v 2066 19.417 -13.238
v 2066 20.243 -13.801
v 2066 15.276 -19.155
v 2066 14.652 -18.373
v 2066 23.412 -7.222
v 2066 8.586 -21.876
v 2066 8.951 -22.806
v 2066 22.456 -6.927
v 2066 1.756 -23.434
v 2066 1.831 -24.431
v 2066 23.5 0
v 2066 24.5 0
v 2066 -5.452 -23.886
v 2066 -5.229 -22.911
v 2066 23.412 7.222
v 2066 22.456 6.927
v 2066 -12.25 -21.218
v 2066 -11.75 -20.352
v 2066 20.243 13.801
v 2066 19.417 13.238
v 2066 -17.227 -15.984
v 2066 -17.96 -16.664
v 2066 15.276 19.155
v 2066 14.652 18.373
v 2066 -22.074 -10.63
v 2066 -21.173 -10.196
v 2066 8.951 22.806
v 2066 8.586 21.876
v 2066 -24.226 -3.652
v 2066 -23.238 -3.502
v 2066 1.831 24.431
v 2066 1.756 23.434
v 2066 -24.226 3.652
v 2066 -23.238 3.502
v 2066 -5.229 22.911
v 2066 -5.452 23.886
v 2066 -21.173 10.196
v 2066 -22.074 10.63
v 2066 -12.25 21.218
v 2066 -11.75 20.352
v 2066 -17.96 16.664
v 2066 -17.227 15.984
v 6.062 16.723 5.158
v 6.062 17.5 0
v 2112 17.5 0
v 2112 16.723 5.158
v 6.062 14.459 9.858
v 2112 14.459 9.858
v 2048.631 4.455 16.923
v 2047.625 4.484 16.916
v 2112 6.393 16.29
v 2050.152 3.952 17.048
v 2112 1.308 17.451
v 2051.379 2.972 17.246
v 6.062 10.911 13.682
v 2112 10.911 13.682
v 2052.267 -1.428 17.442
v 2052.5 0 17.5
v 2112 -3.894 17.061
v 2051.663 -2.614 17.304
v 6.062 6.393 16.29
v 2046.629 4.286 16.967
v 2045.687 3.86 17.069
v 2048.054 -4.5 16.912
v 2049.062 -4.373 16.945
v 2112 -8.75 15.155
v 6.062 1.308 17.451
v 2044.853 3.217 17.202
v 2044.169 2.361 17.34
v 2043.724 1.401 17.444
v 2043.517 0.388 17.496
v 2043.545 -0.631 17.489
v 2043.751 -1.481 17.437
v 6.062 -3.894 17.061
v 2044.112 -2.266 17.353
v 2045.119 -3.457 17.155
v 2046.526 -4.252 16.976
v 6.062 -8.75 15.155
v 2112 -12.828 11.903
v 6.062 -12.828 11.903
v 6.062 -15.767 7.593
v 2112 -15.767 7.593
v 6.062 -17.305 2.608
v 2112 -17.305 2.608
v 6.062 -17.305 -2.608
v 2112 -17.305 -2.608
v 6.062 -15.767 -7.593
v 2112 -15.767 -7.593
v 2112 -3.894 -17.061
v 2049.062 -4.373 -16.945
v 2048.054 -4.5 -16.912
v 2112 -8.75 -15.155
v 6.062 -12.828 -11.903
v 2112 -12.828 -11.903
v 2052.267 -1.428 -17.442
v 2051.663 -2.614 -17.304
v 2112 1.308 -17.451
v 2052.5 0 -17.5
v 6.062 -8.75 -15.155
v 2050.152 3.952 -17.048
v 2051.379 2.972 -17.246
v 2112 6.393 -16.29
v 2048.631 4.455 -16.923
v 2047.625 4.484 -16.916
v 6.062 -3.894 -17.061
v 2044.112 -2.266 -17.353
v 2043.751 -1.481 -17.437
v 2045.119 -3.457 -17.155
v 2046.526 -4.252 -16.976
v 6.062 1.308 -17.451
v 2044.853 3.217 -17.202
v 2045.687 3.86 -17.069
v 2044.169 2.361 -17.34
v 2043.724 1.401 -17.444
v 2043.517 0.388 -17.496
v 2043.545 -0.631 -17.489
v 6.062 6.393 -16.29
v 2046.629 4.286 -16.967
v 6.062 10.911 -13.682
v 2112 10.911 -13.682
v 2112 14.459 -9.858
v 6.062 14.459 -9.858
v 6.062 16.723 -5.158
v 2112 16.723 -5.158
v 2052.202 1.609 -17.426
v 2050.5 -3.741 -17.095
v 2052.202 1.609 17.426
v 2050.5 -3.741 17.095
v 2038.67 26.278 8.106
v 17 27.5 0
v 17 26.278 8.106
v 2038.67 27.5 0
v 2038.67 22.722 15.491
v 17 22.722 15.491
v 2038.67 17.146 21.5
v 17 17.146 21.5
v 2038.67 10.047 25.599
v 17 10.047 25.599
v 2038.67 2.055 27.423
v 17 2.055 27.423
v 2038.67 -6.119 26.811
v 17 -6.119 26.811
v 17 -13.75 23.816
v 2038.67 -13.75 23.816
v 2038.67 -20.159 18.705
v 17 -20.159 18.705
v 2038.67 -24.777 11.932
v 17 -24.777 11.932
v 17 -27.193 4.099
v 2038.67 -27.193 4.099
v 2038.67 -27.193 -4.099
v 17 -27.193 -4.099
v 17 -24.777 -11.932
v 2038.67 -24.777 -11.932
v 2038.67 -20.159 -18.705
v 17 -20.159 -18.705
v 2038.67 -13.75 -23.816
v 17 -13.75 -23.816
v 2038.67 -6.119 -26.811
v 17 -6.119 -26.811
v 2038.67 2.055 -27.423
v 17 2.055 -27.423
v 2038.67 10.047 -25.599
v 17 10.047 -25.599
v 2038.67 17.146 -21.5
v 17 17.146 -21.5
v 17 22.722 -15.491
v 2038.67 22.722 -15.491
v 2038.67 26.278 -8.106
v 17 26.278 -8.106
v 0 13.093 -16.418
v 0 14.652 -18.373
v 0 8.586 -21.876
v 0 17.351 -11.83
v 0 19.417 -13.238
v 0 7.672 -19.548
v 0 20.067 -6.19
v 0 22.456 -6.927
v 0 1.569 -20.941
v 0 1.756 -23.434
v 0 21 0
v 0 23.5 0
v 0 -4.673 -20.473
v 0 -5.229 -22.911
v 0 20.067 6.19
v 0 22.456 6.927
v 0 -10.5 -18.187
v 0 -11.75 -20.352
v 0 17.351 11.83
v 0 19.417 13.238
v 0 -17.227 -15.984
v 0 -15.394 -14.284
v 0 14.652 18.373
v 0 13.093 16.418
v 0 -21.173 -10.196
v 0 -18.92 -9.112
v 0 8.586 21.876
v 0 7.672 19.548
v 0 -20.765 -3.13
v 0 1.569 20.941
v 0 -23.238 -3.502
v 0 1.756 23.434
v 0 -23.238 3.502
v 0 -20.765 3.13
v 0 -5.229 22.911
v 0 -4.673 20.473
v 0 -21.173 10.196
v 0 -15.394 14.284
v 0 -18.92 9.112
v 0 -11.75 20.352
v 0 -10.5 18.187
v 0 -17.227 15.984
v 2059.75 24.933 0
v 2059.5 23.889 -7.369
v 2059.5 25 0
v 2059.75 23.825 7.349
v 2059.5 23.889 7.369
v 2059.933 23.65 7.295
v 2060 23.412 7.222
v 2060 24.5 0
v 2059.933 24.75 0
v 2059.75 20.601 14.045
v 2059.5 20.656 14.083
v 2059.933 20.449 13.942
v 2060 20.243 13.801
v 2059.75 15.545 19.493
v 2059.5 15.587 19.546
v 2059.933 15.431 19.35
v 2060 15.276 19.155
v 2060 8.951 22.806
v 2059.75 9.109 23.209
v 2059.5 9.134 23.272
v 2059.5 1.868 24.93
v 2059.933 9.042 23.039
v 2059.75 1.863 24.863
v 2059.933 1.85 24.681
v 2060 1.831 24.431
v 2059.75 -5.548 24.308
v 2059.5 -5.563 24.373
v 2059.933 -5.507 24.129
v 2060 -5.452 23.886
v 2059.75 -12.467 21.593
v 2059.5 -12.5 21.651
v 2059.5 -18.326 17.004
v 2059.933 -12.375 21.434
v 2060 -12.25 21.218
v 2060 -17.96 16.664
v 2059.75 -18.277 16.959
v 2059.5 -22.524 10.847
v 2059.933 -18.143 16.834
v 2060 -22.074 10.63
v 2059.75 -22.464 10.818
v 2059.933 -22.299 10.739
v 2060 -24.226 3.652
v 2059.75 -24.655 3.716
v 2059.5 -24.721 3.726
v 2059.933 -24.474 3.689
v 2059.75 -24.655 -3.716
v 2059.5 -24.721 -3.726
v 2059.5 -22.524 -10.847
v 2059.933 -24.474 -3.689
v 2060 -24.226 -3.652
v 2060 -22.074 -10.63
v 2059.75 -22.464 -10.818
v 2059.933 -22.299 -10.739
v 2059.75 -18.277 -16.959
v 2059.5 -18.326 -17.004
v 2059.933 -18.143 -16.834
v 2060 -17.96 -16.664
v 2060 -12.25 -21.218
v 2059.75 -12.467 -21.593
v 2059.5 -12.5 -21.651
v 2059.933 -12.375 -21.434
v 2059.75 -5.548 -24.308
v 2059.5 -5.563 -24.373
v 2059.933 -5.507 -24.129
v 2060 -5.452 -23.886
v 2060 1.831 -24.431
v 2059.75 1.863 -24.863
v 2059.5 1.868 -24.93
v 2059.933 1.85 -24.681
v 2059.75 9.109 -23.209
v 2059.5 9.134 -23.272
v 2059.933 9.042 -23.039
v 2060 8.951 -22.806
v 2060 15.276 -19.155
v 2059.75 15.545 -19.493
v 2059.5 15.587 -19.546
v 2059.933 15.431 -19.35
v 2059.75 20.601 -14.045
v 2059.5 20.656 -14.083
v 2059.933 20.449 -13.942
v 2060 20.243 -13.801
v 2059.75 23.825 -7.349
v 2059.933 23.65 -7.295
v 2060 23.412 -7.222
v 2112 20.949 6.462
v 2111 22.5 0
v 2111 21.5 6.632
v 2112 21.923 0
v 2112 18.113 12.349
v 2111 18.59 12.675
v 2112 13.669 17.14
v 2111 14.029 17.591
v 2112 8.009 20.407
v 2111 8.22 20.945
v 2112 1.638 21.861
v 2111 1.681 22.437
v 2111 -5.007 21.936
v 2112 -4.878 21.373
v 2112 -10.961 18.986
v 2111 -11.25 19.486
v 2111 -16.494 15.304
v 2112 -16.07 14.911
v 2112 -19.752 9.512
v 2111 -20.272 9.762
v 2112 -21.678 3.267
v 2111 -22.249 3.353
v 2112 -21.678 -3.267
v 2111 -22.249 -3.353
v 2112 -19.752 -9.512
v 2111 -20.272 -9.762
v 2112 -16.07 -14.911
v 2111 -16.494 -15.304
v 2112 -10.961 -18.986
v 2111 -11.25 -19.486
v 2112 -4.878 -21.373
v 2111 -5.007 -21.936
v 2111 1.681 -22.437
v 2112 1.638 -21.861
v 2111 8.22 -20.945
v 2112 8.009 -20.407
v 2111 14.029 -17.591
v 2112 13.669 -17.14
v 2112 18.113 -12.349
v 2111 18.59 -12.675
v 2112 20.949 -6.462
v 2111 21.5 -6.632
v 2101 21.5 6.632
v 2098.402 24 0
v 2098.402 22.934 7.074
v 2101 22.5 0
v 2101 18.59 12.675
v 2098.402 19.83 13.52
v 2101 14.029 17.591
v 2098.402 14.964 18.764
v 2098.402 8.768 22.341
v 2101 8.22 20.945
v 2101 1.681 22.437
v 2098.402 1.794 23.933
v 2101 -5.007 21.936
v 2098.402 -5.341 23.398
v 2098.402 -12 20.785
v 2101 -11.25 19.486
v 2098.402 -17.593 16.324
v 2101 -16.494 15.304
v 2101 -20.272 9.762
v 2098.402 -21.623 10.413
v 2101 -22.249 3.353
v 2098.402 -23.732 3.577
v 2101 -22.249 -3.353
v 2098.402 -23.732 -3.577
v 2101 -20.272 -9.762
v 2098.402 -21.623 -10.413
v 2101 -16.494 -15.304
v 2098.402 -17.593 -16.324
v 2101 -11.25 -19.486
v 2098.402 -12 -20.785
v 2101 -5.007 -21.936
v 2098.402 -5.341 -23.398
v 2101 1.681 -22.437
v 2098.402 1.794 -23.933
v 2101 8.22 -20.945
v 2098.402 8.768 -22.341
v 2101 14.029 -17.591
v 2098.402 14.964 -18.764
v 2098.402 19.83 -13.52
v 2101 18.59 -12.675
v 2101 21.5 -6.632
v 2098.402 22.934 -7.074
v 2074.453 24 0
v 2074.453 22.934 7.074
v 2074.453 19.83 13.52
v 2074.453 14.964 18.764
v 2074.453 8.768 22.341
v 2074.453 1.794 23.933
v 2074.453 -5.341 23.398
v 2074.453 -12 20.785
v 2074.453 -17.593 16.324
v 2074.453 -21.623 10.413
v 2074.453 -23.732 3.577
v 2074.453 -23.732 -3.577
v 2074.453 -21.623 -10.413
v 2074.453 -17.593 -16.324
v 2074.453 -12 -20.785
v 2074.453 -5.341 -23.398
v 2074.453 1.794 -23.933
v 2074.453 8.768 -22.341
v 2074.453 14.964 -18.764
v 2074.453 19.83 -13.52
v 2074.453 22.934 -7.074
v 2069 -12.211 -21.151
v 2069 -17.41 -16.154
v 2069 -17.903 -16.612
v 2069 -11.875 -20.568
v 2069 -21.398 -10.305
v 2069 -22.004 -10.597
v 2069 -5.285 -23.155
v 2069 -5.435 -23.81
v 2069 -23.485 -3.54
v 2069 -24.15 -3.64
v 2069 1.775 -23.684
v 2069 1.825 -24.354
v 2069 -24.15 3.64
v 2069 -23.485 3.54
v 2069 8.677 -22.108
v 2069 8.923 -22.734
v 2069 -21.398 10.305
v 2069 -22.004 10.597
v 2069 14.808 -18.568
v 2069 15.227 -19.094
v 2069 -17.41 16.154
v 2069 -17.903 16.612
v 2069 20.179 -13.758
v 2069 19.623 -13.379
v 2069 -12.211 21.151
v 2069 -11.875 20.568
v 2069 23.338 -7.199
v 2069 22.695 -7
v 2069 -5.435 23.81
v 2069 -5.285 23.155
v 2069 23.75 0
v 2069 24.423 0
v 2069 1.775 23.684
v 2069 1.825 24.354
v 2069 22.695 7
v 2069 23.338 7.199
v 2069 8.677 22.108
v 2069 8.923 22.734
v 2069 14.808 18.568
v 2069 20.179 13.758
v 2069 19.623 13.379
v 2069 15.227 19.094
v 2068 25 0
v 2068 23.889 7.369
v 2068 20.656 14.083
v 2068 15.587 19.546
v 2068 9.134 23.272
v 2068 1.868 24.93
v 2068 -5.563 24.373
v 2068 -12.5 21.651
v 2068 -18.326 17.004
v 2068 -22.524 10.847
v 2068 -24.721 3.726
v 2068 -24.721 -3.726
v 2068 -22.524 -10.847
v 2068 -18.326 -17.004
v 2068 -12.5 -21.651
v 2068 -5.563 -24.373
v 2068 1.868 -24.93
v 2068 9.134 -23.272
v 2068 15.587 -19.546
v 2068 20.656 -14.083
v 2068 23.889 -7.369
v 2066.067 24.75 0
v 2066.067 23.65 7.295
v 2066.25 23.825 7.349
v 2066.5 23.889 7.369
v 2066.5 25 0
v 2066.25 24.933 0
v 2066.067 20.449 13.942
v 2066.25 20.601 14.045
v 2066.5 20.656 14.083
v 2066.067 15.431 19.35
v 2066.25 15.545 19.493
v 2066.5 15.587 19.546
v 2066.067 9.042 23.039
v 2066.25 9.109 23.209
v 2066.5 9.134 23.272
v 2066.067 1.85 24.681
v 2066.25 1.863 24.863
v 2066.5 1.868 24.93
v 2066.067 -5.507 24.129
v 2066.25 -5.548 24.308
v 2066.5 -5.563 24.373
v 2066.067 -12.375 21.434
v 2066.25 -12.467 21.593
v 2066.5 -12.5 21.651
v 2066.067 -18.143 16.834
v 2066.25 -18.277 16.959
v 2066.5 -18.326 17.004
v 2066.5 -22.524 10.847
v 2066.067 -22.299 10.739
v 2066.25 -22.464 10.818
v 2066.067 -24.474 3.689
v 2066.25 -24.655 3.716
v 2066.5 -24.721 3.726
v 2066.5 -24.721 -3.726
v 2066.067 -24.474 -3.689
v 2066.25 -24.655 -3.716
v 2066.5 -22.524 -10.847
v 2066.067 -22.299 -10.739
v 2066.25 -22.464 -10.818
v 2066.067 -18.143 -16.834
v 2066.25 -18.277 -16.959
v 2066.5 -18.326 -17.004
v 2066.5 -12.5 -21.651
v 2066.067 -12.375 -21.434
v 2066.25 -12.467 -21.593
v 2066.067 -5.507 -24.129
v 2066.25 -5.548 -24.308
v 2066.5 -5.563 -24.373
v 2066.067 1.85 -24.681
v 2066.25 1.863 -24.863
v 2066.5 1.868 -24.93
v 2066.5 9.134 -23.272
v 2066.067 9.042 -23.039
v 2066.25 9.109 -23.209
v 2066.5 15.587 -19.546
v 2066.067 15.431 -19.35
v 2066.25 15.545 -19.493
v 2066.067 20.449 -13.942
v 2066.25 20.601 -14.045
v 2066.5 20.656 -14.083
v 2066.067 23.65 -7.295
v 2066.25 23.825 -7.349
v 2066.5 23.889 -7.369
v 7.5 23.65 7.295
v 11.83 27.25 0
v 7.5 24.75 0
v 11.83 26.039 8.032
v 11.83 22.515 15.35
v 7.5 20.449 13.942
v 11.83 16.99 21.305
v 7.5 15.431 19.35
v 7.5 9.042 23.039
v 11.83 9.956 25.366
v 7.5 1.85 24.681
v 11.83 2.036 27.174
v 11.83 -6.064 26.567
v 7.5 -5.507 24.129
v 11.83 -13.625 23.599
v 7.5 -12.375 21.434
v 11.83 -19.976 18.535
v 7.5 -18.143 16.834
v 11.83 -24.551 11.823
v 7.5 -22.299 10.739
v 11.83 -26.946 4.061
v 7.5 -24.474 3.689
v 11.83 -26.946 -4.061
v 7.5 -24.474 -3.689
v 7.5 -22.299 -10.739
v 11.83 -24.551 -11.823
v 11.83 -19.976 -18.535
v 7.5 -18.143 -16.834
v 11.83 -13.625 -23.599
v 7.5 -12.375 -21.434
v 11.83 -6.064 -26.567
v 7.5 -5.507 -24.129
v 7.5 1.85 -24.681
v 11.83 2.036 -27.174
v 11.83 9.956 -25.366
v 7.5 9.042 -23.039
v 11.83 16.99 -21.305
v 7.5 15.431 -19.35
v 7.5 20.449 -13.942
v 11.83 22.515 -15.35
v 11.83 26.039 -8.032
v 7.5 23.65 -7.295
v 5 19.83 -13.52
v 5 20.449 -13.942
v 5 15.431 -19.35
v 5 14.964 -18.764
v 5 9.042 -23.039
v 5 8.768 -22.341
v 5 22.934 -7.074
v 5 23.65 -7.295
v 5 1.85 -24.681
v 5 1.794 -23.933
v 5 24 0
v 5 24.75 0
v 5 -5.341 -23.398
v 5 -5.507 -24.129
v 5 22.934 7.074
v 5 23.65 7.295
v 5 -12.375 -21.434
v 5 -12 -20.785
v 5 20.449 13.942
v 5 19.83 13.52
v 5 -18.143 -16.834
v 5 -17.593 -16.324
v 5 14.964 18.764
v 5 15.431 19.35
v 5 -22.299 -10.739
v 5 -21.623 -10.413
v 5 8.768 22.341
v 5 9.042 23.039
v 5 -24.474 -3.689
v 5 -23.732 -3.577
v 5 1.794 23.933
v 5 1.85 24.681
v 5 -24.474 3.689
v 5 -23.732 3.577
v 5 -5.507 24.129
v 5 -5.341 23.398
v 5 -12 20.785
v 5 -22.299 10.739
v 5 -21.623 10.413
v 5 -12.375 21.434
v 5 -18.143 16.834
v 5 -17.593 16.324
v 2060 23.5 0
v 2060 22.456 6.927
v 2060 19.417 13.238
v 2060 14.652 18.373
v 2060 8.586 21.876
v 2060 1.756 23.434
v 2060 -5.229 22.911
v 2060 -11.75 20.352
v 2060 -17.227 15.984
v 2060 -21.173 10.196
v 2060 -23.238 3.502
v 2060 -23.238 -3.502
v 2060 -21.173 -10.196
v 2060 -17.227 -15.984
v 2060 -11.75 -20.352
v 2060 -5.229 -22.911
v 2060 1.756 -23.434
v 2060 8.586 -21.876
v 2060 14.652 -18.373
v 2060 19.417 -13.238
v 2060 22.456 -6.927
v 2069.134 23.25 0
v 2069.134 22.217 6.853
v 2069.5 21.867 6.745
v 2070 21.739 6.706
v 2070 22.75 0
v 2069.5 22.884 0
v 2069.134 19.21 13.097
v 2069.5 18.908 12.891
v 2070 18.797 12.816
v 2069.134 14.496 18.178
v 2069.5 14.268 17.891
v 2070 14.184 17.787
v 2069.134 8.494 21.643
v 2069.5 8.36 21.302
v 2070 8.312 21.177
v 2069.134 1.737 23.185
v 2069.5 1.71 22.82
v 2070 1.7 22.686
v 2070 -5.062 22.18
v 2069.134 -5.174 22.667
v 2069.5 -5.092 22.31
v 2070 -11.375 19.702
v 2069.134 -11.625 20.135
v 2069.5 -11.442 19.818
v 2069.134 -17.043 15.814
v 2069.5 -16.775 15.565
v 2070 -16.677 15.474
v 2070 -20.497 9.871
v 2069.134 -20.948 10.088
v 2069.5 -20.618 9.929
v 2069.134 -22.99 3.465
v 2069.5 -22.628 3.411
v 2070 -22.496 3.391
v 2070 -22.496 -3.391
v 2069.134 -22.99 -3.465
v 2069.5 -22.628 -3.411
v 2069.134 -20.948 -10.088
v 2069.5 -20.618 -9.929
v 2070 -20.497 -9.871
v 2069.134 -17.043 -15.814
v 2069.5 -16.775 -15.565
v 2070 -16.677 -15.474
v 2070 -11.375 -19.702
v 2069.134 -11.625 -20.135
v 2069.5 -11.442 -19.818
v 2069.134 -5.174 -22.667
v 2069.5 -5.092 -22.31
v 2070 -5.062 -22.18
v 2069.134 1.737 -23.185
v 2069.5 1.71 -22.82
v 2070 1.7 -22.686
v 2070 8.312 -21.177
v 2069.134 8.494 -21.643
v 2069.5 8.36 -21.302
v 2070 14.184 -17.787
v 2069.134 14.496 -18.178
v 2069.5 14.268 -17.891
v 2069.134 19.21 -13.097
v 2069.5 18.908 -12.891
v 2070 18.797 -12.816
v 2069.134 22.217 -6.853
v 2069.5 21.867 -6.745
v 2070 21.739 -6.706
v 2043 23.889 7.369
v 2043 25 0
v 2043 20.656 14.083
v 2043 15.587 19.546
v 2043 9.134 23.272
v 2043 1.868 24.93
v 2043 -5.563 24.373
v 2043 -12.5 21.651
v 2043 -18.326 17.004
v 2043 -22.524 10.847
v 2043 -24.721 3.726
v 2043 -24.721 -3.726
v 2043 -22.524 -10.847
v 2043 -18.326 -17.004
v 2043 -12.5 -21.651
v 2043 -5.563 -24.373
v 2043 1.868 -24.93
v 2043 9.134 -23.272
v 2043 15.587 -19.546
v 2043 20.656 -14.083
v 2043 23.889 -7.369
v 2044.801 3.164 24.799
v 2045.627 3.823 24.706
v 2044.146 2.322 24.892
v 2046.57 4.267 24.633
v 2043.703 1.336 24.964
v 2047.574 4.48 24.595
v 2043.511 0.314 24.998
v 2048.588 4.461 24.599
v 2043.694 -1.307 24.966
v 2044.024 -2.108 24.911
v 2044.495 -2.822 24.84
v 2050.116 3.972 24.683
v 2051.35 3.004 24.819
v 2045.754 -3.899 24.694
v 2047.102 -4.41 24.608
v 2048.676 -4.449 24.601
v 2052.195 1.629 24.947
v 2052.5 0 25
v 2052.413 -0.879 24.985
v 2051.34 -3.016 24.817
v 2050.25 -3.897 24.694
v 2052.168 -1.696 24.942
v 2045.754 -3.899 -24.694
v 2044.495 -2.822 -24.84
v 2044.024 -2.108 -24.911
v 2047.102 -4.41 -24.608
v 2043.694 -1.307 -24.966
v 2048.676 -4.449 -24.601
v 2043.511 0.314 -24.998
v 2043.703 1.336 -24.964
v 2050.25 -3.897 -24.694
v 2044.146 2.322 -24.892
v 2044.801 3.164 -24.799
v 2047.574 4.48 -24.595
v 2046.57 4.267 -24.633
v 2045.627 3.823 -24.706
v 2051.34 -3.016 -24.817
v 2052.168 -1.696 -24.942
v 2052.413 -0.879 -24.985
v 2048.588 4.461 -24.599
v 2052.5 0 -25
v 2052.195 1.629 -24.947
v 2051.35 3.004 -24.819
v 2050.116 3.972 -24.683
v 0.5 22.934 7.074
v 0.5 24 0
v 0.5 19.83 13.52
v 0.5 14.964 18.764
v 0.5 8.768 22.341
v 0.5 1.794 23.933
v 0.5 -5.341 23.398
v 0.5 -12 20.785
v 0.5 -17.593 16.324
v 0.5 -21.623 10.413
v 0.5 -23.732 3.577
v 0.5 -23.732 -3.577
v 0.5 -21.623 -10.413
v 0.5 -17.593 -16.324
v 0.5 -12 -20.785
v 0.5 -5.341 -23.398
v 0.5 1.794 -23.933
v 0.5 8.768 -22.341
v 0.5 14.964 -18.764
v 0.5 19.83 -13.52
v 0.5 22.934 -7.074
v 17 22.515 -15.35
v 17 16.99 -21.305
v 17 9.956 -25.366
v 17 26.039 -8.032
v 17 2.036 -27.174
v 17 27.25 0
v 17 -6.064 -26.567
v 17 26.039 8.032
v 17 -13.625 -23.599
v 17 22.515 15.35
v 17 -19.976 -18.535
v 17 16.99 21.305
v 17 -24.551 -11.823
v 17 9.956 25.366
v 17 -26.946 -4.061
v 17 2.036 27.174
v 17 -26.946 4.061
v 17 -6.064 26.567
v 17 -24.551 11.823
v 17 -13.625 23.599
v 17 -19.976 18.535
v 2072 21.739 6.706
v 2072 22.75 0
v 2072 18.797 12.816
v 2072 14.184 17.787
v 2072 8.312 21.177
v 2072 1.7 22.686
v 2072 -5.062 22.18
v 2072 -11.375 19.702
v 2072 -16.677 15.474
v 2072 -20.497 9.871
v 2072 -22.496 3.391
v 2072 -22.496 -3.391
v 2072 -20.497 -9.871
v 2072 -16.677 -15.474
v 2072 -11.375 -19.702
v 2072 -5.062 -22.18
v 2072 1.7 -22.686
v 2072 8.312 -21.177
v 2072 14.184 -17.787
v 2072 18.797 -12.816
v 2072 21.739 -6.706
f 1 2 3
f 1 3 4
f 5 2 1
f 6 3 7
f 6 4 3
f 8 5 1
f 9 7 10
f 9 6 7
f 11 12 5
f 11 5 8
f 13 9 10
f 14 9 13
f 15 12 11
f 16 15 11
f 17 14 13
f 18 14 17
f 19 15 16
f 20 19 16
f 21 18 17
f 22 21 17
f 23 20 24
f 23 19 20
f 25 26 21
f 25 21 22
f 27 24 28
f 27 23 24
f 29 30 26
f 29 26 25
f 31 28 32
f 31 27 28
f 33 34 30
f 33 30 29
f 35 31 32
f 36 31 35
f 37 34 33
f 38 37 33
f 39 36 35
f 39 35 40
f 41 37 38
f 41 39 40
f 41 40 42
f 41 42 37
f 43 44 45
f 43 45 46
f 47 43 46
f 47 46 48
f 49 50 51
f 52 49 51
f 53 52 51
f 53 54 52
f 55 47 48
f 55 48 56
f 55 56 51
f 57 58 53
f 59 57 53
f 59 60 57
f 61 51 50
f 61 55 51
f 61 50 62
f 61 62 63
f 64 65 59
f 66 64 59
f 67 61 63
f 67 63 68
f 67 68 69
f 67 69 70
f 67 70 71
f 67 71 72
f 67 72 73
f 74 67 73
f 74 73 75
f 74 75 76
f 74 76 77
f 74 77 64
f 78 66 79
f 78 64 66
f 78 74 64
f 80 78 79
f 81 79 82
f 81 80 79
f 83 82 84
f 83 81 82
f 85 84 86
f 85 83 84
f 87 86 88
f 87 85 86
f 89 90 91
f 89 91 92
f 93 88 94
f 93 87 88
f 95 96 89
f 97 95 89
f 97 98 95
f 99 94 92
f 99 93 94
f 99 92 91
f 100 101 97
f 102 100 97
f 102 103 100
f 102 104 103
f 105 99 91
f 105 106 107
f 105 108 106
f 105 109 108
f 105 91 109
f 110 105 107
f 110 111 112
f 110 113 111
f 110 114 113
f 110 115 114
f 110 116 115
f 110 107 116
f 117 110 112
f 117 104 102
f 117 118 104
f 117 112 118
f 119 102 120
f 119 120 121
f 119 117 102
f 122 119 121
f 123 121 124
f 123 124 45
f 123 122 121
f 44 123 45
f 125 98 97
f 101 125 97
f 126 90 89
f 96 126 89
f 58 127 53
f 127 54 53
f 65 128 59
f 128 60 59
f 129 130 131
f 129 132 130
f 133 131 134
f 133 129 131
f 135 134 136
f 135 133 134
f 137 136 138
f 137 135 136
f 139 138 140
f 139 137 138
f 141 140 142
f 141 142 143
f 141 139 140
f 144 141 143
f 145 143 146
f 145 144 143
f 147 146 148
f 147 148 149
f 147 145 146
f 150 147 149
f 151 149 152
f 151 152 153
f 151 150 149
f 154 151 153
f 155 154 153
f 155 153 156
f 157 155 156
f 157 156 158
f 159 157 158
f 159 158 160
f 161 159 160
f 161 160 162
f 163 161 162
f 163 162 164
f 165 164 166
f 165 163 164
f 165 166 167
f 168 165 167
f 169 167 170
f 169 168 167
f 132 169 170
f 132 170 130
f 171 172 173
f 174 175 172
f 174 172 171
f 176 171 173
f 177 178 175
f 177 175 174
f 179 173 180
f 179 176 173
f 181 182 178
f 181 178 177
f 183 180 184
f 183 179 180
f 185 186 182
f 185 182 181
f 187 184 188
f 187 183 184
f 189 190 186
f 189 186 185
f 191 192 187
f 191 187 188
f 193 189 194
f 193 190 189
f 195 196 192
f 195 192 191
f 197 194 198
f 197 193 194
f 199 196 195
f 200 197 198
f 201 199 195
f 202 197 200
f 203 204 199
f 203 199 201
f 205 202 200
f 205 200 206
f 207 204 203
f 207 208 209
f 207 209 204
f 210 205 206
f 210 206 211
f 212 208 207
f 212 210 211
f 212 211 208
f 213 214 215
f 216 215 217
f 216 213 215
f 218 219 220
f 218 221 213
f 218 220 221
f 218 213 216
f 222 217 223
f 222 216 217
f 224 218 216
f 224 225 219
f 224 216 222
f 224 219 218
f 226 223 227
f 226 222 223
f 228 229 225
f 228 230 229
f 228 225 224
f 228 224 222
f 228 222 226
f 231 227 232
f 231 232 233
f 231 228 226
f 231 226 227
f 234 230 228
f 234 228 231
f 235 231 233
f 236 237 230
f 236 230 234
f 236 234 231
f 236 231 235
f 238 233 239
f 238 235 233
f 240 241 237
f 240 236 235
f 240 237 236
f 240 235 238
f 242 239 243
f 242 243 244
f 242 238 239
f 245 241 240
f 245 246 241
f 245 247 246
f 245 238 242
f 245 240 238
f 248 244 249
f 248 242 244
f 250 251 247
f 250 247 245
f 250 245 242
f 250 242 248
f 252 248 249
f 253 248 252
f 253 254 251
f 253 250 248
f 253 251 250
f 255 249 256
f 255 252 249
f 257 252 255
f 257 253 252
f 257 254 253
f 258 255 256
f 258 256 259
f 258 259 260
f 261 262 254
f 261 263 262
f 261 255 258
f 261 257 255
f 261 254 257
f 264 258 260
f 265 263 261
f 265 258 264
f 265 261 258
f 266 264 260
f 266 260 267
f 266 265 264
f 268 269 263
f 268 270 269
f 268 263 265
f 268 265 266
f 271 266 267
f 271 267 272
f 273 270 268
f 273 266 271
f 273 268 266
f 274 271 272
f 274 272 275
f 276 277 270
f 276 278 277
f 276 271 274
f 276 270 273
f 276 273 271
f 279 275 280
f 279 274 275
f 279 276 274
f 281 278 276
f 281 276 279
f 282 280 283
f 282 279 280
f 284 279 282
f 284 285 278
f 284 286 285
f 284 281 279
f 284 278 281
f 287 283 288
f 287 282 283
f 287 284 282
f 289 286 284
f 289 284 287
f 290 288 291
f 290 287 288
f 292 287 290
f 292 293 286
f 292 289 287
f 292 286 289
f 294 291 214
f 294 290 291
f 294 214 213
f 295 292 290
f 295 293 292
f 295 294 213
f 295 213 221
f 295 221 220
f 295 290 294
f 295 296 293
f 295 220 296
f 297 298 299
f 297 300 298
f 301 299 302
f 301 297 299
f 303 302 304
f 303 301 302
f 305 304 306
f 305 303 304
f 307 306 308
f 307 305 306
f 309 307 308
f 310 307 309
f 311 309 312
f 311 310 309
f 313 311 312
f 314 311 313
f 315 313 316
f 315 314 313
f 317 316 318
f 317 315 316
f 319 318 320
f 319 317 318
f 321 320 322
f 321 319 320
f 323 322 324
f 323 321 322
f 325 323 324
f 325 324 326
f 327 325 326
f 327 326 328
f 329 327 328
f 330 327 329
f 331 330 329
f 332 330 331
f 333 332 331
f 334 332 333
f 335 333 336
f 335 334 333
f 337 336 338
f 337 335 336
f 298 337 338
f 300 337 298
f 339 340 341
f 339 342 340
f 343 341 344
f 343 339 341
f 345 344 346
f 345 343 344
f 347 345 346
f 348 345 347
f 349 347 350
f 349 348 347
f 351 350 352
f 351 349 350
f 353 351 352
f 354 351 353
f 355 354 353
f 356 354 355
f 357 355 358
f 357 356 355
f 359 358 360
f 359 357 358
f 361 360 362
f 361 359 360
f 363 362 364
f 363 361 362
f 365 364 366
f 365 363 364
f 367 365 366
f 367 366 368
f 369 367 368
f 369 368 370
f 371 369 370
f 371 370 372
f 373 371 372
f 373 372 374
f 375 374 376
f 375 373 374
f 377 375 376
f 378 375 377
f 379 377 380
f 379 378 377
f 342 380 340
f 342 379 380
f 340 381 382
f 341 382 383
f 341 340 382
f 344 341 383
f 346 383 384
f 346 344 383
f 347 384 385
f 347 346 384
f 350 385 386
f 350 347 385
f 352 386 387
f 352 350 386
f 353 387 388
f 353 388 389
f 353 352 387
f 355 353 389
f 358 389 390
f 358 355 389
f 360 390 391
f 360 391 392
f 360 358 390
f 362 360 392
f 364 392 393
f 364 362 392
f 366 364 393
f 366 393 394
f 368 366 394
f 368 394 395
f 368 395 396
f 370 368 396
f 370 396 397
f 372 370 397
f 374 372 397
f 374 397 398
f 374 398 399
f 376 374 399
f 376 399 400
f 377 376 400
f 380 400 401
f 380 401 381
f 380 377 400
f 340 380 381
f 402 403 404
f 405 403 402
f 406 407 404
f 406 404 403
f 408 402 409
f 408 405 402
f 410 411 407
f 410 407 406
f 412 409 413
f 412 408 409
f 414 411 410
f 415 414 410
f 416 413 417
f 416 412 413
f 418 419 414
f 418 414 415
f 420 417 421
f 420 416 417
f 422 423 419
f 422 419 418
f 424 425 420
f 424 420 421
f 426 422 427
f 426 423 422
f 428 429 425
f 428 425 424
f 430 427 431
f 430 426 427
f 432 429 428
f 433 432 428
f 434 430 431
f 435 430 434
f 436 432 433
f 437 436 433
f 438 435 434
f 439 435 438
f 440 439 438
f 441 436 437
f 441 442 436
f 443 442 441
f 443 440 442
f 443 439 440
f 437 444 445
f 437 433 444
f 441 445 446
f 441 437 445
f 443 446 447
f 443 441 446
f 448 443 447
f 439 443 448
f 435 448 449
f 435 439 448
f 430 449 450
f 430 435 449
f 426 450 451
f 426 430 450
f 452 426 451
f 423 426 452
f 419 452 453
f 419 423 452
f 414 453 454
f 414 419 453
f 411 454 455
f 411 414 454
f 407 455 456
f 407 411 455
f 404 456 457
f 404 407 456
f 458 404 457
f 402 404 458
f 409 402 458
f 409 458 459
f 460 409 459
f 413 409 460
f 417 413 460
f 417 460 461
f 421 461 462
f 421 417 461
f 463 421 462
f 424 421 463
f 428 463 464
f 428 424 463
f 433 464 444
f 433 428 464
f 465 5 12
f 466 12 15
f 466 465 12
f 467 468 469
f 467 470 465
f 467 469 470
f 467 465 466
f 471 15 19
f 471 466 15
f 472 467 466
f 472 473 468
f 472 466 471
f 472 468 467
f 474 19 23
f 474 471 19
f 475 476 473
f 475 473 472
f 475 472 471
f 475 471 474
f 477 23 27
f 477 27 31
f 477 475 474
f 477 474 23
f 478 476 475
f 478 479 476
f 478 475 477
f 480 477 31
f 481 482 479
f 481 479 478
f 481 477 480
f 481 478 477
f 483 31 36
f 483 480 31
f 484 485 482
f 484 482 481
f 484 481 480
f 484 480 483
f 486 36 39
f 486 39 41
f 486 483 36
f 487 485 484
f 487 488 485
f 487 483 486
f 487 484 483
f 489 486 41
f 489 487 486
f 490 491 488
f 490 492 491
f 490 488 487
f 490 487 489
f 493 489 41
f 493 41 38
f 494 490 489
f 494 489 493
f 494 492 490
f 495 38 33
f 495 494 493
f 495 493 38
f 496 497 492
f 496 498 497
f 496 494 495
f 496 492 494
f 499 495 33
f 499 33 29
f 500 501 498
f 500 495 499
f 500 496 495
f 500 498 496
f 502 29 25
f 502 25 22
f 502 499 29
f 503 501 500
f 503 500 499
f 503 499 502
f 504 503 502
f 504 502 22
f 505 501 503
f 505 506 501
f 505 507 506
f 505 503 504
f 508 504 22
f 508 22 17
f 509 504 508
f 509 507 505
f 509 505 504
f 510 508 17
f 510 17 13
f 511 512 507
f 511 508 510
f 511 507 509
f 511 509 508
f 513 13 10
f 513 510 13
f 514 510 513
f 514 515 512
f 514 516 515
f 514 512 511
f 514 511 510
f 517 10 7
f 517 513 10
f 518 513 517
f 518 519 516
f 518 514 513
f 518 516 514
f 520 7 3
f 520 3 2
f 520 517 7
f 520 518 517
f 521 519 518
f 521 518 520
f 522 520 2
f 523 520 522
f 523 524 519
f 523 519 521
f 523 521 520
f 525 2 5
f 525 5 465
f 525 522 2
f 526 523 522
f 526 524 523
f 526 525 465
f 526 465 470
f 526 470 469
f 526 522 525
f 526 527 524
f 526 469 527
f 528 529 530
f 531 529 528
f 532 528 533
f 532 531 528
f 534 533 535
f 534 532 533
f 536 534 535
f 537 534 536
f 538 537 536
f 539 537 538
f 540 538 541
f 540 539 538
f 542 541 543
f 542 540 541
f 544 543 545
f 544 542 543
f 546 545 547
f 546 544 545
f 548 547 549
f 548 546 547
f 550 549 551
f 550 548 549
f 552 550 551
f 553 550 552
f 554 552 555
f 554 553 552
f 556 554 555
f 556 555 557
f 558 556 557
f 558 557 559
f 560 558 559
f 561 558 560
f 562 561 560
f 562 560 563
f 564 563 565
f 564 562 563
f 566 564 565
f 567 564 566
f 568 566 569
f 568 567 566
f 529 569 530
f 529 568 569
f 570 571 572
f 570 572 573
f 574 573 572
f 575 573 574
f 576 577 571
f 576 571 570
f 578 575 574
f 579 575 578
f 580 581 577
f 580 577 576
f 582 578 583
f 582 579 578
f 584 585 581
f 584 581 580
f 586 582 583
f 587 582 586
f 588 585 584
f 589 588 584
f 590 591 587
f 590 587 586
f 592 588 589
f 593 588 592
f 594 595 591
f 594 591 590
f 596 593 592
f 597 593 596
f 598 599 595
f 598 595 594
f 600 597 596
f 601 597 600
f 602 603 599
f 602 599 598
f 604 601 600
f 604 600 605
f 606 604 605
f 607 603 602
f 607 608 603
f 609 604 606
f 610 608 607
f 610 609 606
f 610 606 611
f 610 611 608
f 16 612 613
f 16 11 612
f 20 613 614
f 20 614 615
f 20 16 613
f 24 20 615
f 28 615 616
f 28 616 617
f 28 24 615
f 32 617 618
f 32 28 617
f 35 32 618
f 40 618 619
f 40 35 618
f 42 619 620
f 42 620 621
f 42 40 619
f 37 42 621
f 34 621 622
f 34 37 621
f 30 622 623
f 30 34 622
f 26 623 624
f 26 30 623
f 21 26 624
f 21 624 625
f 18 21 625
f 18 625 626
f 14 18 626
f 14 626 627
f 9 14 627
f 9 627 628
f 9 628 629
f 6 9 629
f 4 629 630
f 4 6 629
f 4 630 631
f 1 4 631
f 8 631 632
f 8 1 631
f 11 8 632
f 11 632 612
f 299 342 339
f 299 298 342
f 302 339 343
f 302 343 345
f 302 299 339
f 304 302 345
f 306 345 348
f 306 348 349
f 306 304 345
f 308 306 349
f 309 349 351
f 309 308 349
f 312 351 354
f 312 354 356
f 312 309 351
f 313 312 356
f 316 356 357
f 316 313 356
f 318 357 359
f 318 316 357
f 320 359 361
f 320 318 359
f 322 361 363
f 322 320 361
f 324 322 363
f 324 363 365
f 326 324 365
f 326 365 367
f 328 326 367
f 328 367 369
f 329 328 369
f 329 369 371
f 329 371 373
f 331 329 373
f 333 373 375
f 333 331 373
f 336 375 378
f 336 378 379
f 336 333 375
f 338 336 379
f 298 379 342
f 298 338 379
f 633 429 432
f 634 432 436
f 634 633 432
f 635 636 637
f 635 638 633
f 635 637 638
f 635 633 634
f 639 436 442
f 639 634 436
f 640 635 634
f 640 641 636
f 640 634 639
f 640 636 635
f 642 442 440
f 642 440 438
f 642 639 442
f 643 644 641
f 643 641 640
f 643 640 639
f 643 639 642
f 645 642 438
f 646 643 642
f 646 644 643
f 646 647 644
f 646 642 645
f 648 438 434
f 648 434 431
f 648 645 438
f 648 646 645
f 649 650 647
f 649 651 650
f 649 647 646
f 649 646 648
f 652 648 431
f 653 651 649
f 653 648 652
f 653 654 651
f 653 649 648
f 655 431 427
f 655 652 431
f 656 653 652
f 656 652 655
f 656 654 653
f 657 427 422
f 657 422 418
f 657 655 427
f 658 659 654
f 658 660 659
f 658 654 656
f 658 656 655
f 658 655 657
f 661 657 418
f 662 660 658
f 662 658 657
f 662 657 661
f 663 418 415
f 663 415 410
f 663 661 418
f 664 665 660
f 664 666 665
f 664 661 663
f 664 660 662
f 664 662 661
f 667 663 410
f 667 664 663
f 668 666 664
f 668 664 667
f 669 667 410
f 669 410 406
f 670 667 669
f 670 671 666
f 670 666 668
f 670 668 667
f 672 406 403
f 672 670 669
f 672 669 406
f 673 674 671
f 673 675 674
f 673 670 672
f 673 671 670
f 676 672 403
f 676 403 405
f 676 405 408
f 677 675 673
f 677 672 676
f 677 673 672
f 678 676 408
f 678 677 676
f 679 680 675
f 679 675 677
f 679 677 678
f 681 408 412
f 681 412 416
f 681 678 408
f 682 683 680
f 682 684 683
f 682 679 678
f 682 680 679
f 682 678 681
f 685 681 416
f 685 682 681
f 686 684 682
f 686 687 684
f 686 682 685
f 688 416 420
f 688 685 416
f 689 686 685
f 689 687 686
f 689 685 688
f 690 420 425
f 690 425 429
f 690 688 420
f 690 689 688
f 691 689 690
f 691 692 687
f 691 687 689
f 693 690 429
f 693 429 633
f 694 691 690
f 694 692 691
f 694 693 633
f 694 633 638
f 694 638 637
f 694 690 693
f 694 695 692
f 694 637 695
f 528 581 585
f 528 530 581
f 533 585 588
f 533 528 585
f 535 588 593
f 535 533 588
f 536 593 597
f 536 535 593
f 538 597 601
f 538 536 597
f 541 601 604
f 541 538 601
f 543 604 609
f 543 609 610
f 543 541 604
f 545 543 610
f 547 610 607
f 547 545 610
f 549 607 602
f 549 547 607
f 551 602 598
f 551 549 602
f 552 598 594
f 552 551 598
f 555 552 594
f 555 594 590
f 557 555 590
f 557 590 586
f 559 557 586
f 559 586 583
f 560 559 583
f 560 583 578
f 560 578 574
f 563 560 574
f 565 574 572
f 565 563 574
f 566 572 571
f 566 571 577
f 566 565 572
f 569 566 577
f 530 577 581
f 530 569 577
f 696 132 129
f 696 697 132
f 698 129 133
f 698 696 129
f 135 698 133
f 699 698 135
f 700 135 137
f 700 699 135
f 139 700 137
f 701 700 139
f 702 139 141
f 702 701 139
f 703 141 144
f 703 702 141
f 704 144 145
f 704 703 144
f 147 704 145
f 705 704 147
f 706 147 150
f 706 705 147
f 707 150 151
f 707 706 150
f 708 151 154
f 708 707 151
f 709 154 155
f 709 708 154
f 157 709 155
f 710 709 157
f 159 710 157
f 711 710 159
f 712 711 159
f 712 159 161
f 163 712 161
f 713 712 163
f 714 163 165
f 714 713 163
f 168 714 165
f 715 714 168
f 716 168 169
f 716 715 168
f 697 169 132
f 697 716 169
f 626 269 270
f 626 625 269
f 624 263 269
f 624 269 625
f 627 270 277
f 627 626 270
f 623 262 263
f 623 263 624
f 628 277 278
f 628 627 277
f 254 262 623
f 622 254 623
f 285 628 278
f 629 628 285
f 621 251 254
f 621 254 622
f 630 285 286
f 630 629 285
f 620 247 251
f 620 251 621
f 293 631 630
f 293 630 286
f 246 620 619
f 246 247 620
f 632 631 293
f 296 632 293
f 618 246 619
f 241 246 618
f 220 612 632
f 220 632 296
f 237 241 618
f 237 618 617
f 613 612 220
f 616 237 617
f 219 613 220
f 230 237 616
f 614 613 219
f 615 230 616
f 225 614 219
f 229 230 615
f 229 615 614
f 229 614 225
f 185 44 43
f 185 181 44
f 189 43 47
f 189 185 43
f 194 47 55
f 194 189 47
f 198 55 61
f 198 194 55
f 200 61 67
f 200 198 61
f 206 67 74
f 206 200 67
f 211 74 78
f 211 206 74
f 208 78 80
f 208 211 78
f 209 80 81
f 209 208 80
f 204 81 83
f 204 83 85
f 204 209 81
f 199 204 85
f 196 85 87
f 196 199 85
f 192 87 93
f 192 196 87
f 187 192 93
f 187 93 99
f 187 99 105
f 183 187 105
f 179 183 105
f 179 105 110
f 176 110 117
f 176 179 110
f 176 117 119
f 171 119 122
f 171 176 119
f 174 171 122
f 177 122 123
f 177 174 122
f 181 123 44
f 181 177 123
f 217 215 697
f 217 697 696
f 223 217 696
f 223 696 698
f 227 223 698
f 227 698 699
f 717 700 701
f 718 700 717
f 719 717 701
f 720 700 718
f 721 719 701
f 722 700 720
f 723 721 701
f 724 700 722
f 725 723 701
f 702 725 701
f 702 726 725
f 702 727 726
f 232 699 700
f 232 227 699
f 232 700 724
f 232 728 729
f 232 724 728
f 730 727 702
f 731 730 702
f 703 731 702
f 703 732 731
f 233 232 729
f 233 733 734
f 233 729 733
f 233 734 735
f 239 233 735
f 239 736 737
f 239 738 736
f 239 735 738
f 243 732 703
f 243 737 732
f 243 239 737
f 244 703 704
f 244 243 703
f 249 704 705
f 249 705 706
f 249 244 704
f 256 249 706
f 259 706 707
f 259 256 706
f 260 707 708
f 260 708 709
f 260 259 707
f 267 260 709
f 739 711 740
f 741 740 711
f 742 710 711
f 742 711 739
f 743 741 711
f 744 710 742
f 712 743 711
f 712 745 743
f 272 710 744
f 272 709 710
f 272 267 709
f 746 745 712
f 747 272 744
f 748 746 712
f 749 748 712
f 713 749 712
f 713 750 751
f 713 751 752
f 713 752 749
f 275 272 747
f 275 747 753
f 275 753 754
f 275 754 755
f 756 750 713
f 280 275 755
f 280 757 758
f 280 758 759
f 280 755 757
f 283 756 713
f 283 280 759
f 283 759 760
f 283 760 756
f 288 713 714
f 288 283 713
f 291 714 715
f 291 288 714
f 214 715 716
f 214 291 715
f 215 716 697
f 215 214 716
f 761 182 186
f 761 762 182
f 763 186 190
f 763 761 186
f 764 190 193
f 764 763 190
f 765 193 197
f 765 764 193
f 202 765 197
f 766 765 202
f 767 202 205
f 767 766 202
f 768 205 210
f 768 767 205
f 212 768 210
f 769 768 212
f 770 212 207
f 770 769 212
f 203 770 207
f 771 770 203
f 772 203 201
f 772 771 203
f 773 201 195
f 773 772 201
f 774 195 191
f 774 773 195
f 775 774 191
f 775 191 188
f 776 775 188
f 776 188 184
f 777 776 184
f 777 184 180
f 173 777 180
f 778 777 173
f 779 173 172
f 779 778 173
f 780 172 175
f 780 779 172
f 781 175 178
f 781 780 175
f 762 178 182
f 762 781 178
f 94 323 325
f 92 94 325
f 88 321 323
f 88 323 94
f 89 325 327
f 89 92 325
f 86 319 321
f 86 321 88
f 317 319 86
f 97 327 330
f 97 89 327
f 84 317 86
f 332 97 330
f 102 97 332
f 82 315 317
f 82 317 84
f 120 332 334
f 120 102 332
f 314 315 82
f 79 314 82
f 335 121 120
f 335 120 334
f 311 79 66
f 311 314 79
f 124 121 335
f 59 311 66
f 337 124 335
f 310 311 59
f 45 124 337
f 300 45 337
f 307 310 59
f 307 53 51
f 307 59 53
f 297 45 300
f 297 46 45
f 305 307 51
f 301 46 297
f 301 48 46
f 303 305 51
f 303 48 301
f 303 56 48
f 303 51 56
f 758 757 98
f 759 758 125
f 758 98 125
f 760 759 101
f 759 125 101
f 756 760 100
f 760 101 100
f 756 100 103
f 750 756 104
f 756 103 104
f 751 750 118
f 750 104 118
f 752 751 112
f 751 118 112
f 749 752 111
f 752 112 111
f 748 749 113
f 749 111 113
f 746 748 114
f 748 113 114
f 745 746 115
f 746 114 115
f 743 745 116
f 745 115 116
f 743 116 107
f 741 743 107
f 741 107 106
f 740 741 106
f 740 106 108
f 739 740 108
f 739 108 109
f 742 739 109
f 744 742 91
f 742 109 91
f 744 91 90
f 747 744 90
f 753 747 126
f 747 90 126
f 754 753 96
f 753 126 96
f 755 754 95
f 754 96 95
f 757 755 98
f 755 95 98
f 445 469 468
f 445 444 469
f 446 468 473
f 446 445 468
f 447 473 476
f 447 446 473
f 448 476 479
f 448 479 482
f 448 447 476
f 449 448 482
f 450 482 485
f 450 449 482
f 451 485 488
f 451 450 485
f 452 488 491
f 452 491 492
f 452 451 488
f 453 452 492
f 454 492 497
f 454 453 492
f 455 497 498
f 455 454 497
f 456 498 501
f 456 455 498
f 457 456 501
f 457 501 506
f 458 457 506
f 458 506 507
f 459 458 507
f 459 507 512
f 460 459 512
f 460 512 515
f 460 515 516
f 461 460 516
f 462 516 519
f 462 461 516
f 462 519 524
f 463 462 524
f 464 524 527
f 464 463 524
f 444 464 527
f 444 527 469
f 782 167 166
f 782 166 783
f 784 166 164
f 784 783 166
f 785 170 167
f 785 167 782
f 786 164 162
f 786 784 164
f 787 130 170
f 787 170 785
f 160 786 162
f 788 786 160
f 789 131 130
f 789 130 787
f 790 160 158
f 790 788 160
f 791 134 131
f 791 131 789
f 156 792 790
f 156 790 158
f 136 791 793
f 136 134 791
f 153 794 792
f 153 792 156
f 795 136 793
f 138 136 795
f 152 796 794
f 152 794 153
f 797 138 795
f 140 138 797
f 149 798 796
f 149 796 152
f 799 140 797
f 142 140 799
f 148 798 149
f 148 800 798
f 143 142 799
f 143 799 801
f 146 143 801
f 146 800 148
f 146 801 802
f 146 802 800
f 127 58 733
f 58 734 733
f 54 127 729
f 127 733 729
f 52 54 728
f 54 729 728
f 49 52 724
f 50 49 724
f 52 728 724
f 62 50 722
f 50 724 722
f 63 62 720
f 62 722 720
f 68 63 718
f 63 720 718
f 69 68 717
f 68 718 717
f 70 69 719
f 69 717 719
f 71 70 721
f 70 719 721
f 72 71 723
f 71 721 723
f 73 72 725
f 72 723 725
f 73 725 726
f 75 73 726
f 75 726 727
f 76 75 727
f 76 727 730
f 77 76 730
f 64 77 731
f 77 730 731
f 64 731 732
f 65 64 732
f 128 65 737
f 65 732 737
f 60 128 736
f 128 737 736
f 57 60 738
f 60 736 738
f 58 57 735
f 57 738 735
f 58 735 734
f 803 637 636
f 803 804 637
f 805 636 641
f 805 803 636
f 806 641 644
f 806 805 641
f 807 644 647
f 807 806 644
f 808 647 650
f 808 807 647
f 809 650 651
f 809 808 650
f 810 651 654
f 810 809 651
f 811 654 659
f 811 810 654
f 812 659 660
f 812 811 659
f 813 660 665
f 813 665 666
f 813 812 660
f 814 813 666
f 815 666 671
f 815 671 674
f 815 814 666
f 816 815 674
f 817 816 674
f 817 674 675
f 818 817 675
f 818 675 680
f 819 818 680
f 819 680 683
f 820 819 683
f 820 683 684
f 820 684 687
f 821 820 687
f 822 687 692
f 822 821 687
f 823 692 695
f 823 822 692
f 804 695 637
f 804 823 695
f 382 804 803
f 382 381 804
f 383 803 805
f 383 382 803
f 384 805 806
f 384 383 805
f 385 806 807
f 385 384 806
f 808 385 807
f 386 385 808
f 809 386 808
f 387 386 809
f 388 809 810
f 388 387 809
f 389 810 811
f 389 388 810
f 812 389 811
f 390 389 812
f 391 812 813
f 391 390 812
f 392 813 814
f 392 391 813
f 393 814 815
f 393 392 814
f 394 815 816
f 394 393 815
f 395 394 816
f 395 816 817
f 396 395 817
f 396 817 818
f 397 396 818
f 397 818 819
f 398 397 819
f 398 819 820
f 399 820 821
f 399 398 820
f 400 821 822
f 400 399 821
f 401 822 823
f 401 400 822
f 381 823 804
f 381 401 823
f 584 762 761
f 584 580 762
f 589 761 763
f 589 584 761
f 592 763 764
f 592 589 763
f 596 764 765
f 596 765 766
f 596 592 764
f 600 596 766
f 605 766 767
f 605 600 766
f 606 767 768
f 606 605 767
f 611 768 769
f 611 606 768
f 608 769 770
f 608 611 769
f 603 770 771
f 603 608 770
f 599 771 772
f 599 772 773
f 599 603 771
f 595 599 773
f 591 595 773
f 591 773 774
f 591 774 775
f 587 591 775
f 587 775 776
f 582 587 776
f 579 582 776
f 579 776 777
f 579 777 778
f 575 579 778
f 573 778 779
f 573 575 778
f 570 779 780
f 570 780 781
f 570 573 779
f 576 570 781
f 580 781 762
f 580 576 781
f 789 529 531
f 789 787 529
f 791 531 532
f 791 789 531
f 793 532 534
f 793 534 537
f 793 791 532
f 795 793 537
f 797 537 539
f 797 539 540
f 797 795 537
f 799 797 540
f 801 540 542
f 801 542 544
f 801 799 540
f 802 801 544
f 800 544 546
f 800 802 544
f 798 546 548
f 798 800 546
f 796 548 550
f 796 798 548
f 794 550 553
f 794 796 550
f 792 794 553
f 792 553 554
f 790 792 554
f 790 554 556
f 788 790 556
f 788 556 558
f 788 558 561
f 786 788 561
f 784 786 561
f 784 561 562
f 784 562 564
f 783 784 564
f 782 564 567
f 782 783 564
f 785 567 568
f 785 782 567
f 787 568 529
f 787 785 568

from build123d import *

# Parameters (mm, degrees)
SKETCH2_R          = 4.5
CUT_EXTRUDE1_DEPTH = 50


with BuildPart() as part:
    # Sketch1 → Base-Revolve (revolve)
    with BuildSketch(Plane.XY):
        with BuildLine():
            Line((0, 21), (0, 23.5))
            Line((0, 23.5), (0.5, 24))
            Line((0.5, 24), (5, 24))
            Line((5, 24), (5, 24.75))
            Line((5, 24.75), (7.5, 24.75))
            Line((7.5, 24.75), (11.830127019, 27.25))
            Line((11.830127019, 27.25), (17, 27.25))
            Line((17, 27.25), (17, 27.5))
            Line((17, 27.5), (2038.669872981, 27.5))
            Line((2038.669872981, 27.5), (2043, 25))
            Line((2043, 25), (2059.5, 25))
            ThreePointArc((2059.5, 25), (2059.853553391, 24.853553391), (2060, 24.5))
            Line((2060, 24.5), (2060, 23.5))
            Line((2060, 23.5), (2066, 23.5))
            Line((2066, 23.5), (2066, 24.5))
            ThreePointArc((2066, 24.5), (2066.146446609, 24.853553391), (2066.5, 25))
            Line((2066.5, 25), (2068, 25))
            Line((2068, 25), (2069, 24.422649731))
            Line((2069, 24.422649731), (2069, 23.75))
            ThreePointArc((2069, 23.75), (2069.292893219, 23.042893219), (2070, 22.75))
            Line((2070, 22.75), (2072, 22.75))
            Line((2072, 22.75), (2074.453263132, 24))
            Line((2074.453263132, 24), (2098.401923789, 24))
            Line((2098.401923789, 24), (2101, 22.5))
            Line((2101, 22.5), (2111, 22.5))
            Line((2111, 22.5), (2112, 21.922649731))
            Line((2112, 21.922649731), (2112, 17.5))
            Line((2112, 17.5), (6.062177826, 17.5))
            Line((6.062177826, 17.5), (0, 21))
        make_face()
    revolve(axis=Axis((0, 0, 0), (1, 0, 0)))

    # Sketch2 → Cut-Extrude1 (cut, symmetric)
    with BuildSketch(Plane.XY):
        with Locations((2048, 0)):
            Circle(SKETCH2_R)
    extrude(amount=CUT_EXTRUDE1_DEPTH, both=True, mode=Mode.SUBTRACT)


solid = part.part
